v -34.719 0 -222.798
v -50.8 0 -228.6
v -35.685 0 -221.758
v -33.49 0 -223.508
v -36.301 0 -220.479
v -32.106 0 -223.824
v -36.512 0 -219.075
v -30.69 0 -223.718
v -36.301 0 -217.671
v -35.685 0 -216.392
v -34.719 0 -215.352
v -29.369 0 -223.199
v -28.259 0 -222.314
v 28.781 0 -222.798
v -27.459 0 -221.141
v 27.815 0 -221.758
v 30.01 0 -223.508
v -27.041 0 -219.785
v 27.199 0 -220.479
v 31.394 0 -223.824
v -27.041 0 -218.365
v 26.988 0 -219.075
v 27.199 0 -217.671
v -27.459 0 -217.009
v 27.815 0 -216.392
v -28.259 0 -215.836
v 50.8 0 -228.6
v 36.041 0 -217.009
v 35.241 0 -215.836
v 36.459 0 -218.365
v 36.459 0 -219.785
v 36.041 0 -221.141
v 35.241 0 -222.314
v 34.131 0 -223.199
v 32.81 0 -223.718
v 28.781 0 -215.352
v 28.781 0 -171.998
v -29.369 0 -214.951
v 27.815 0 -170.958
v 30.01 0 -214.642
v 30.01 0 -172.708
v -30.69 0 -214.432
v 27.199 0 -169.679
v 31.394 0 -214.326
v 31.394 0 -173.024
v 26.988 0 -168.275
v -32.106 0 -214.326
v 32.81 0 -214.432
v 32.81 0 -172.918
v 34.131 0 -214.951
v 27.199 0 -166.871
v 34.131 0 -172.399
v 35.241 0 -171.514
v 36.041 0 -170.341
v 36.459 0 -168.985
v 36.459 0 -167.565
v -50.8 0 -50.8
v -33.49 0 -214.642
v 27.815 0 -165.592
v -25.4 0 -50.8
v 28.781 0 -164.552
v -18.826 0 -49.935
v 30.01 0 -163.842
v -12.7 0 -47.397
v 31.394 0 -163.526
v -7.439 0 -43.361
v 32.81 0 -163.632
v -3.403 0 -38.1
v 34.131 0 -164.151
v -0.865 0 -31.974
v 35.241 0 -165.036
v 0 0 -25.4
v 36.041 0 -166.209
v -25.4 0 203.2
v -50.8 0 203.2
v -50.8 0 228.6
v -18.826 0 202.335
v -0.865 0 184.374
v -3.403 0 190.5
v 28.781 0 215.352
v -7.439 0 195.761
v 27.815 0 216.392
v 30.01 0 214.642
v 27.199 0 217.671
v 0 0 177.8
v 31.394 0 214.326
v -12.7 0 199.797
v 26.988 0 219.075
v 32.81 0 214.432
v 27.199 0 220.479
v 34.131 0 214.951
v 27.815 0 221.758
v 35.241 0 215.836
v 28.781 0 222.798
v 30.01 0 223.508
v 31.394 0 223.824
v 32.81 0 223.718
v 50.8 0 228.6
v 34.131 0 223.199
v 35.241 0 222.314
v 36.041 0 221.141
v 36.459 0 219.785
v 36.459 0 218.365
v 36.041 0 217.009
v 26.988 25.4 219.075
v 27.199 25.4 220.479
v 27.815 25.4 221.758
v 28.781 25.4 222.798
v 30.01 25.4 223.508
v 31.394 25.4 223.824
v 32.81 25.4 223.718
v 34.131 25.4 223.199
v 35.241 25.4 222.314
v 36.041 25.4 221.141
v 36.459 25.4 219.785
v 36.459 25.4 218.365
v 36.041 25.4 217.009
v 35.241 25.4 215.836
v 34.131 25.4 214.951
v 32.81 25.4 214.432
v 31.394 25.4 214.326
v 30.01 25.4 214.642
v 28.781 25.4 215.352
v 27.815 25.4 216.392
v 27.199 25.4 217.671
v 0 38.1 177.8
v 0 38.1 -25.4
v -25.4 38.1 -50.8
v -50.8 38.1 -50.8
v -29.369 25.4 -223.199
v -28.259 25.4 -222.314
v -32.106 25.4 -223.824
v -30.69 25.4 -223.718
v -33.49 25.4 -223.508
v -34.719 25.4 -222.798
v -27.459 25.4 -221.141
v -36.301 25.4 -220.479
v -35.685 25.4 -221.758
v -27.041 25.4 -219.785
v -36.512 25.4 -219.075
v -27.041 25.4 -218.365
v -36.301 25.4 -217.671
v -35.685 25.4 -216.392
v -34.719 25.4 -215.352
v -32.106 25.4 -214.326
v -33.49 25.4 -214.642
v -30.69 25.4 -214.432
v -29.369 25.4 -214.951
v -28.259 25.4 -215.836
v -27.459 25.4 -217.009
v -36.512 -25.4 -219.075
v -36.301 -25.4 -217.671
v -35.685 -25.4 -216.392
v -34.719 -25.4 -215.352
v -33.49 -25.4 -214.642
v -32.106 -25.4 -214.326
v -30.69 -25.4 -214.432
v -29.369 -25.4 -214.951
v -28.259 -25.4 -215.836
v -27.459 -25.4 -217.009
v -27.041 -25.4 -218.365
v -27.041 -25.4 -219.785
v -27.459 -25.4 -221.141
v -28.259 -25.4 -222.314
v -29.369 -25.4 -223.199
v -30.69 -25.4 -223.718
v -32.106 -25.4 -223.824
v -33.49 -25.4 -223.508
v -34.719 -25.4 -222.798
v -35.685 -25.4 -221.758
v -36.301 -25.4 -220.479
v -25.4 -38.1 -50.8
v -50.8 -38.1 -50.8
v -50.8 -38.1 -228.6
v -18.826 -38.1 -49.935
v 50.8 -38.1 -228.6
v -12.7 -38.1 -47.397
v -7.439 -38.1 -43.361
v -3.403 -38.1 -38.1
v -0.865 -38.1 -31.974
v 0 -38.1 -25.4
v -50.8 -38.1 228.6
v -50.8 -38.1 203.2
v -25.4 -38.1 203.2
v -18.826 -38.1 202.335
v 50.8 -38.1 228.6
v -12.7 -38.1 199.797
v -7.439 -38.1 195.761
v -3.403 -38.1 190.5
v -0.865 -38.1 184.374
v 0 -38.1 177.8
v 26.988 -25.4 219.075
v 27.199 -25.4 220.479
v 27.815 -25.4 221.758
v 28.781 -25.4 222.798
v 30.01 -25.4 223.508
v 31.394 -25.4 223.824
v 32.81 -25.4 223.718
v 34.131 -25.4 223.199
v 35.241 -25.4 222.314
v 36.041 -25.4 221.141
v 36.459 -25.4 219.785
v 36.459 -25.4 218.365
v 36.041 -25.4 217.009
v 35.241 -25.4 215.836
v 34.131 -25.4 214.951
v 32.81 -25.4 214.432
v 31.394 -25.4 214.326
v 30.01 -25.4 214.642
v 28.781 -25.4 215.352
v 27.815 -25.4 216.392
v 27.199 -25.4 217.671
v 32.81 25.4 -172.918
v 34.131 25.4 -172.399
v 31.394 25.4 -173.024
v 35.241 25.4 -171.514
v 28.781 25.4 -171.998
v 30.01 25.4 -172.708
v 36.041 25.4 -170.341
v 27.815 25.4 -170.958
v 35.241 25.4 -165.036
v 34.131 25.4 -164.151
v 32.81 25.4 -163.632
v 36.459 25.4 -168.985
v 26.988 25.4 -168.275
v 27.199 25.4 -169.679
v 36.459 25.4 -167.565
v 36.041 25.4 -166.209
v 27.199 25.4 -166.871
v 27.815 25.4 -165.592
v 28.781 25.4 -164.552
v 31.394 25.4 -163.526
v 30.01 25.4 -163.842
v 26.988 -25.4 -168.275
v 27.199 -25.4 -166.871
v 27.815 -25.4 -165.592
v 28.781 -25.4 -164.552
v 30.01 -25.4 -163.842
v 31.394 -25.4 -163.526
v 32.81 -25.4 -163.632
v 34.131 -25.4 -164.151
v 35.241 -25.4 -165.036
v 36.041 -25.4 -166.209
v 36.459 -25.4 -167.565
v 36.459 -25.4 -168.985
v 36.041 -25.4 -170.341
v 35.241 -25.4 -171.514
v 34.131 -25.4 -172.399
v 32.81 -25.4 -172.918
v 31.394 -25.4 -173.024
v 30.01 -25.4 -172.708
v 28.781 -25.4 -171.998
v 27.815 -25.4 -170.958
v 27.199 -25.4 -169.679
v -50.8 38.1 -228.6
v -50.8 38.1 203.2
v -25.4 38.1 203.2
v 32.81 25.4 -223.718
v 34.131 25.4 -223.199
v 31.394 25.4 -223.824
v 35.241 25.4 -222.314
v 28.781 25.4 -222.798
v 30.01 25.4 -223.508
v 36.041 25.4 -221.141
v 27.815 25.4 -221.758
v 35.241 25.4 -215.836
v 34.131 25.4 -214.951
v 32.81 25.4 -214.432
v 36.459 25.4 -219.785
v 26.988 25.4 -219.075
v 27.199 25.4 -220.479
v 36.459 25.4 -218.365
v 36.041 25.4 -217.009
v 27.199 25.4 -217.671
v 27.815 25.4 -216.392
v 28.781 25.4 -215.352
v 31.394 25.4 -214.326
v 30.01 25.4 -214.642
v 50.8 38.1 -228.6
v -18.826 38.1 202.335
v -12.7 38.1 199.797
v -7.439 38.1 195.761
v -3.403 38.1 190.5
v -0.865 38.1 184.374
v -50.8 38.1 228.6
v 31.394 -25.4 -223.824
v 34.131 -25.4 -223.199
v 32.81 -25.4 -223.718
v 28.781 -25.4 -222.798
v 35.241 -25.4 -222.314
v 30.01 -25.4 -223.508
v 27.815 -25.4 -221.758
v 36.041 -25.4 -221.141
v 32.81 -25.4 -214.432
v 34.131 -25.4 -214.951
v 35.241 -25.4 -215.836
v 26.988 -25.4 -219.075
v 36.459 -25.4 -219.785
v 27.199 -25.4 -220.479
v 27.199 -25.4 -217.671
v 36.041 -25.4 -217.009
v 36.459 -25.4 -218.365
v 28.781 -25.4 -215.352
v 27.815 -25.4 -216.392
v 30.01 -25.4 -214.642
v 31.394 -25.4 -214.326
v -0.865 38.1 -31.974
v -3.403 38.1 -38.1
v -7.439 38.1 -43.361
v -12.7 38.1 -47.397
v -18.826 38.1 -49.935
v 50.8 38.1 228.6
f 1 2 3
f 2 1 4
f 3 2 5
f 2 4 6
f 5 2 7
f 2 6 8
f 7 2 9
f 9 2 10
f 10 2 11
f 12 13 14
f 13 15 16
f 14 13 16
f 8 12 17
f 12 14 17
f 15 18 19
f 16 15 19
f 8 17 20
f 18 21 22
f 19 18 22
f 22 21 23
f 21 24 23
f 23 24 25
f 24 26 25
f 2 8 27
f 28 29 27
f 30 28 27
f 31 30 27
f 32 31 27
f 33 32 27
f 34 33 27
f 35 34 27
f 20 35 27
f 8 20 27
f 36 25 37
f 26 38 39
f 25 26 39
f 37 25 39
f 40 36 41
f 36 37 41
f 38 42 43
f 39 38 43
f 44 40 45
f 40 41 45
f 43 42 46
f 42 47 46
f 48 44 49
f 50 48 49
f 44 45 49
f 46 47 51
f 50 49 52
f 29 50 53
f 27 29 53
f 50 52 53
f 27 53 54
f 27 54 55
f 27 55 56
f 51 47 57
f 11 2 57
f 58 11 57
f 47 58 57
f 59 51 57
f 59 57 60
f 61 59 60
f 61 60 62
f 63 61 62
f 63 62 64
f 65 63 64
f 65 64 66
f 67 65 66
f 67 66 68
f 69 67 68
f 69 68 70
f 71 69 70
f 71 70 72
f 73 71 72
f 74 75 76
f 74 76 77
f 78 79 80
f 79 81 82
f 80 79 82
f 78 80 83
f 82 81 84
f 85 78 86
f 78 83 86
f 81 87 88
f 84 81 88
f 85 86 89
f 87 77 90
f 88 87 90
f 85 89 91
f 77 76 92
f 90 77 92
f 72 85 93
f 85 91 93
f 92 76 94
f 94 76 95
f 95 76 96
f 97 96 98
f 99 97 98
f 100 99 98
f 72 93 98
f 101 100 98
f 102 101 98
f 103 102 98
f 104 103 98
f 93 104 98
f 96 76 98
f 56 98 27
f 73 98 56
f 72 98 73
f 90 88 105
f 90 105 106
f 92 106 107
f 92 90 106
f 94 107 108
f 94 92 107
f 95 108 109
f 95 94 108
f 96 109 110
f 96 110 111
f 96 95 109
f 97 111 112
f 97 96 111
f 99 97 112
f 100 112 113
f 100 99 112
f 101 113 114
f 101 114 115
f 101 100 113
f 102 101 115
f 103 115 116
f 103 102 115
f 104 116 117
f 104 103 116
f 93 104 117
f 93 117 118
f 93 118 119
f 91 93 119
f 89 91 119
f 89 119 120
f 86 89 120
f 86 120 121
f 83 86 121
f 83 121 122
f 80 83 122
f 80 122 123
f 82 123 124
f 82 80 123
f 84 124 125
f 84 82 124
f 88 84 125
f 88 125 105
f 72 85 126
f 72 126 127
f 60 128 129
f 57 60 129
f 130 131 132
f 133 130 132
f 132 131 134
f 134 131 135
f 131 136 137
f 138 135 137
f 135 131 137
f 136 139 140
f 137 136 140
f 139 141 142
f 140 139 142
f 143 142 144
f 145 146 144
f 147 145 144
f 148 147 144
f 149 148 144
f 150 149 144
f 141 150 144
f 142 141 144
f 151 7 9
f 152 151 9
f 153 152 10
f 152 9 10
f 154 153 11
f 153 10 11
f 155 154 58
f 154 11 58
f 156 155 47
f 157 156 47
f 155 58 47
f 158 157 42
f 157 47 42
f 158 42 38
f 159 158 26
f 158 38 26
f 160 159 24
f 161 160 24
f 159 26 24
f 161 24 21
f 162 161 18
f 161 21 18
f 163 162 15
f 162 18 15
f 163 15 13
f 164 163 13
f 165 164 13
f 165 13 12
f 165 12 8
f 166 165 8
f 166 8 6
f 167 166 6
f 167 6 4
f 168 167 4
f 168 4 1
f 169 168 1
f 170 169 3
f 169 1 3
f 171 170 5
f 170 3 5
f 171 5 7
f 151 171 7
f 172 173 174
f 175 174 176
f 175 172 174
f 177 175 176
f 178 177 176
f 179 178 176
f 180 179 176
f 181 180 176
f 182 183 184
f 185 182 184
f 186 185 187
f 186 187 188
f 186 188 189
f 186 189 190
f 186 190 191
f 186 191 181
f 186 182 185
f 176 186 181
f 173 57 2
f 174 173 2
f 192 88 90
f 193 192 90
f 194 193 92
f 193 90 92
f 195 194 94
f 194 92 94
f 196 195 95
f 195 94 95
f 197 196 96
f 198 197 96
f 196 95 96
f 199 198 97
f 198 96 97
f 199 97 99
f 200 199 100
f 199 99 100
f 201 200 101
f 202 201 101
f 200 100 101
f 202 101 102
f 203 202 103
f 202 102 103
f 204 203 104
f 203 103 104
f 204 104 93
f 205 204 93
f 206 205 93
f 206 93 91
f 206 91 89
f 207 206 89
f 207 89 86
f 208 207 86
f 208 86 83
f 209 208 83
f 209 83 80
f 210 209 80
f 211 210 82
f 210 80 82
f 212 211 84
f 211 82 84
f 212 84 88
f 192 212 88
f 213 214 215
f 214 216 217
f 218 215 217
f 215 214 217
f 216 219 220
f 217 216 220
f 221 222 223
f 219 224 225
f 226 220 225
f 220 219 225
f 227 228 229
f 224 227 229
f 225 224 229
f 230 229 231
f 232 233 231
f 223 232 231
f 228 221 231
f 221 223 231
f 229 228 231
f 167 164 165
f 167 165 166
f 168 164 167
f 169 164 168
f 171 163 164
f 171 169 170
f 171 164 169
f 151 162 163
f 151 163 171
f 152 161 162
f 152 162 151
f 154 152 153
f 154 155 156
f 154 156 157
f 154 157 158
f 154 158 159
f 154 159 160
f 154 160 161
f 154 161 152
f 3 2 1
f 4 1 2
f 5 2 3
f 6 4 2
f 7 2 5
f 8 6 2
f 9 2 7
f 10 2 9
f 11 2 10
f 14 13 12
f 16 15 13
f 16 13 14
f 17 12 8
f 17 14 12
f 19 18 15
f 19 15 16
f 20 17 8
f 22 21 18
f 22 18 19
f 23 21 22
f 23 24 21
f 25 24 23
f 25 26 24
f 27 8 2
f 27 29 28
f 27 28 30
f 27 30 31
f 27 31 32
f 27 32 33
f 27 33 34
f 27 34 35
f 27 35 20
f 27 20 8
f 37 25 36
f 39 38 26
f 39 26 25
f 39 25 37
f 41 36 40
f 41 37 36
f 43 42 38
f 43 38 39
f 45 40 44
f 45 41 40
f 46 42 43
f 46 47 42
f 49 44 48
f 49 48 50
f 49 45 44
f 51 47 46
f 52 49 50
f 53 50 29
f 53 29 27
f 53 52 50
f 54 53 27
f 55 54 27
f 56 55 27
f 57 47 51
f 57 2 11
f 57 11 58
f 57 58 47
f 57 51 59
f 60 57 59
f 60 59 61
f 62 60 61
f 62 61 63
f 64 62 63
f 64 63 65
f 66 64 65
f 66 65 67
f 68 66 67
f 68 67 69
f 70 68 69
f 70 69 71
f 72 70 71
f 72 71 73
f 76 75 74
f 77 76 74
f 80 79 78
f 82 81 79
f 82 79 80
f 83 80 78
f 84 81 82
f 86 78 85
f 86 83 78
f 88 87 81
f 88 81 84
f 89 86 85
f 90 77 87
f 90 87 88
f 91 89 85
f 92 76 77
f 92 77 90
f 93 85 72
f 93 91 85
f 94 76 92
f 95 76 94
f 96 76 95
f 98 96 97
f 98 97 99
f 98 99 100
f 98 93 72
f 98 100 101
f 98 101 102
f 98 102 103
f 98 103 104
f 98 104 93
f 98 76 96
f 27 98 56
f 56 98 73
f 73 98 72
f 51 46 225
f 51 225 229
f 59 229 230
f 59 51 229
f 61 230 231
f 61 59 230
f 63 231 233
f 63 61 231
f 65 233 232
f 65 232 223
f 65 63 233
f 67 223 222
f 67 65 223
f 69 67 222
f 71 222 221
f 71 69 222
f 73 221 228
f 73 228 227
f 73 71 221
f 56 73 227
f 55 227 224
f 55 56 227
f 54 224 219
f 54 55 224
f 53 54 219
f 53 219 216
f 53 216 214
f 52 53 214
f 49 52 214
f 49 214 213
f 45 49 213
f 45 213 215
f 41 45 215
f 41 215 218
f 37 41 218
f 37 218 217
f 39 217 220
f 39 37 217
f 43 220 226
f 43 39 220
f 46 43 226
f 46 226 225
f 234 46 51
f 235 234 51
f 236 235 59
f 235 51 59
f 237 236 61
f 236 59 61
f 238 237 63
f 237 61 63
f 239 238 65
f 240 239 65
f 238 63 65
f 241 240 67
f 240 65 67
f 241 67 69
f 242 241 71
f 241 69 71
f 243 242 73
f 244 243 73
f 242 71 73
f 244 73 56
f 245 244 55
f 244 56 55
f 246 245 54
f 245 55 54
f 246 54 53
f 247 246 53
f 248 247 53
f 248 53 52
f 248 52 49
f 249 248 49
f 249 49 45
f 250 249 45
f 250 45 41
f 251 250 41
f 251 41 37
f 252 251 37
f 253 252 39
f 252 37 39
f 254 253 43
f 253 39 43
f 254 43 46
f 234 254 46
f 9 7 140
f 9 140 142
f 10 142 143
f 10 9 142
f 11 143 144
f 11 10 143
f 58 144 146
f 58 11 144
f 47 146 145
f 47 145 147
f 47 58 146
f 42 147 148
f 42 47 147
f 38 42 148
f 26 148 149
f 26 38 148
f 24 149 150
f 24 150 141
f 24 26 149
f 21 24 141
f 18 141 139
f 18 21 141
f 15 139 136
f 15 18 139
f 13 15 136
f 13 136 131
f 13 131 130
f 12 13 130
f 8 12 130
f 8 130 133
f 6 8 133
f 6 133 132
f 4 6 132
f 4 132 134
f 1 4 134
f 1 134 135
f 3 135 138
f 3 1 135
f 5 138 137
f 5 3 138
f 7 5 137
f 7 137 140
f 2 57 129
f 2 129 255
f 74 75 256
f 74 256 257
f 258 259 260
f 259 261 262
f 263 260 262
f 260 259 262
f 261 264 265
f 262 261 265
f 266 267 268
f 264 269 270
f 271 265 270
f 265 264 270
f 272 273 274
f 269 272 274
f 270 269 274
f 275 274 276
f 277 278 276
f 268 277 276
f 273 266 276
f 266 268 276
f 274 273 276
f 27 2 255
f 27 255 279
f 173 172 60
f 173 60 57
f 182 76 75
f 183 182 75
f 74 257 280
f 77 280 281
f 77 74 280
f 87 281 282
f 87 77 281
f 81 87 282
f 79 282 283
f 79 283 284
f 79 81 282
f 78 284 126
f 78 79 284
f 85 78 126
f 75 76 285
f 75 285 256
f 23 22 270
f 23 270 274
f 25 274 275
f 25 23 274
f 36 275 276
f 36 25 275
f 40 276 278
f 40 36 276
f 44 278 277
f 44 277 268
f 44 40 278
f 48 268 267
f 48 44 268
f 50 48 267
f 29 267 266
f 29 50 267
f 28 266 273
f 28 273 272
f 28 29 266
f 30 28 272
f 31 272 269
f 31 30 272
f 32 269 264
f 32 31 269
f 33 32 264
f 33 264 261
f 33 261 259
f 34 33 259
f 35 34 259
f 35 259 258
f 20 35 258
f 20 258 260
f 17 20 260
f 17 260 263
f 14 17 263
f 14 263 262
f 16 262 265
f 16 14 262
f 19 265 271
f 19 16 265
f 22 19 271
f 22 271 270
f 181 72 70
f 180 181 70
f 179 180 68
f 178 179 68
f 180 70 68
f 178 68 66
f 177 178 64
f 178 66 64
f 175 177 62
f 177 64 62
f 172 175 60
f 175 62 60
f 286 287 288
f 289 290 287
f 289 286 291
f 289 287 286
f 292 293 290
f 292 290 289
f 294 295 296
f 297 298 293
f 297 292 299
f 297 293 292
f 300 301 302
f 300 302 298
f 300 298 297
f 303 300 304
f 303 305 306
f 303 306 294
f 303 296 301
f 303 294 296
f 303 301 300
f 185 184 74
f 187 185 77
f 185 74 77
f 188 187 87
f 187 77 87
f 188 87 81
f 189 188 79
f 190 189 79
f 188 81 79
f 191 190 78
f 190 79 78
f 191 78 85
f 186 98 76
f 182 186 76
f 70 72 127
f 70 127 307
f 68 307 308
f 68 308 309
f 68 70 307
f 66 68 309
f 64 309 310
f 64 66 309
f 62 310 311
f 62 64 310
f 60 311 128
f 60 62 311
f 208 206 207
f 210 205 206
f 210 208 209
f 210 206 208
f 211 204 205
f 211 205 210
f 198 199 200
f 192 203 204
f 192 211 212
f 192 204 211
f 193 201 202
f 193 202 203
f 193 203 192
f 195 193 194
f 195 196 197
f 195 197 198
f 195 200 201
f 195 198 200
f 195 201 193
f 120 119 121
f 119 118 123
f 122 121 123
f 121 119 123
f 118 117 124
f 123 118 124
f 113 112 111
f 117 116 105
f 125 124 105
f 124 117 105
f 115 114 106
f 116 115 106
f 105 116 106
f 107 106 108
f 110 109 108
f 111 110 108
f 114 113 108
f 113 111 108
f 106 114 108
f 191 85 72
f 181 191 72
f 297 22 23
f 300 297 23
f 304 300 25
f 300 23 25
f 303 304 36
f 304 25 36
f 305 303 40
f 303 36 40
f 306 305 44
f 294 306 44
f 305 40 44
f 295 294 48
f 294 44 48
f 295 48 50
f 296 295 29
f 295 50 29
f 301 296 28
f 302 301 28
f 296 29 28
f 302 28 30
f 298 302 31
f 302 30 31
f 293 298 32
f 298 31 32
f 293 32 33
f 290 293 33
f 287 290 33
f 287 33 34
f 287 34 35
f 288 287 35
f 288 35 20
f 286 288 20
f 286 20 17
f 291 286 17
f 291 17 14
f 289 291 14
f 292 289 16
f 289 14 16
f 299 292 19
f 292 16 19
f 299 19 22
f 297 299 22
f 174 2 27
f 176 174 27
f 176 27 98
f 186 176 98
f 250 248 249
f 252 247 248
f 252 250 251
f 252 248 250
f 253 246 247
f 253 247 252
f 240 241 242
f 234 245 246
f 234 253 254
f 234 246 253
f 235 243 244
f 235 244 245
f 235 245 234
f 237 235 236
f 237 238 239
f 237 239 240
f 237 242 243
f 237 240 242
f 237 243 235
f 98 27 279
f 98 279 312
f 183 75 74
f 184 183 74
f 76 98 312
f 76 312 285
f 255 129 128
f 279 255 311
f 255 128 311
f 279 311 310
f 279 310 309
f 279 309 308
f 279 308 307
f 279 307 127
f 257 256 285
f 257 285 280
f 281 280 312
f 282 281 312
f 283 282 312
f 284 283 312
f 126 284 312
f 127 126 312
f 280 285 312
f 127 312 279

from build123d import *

# Parameters (mm, degrees)
F1_DEPTH = 38.1
F2_R     = 4.7625
F3_DEPTH = 25.4
F4_R     = 4.7625
F5_DEPTH = 25.4


with BuildPart() as f1:
    # F0 (on Front) → F1 (new body)
    with BuildSketch(Plane.XZ):
        with BuildLine():
            Line((50.8, -228.6), (50.8, 228.6))
            Line((50.8, 228.6), (-50.8, 228.6))
            Line((-50.8, 228.6), (-50.8, 203.2))
            Line((-50.8, 203.2), (-25.4, 203.2))
            ThreePointArc((-25.4, 203.2), (-7.439488, 195.760512), (0, 177.8))
            Line((0, 177.8), (0, -25.4))
            ThreePointArc((0, -25.4), (-7.439488, -43.360512), (-25.4, -50.8))
            Line((-25.4, -50.8), (-50.8, -50.8))
            Line((-50.8, -50.8), (-50.8, -228.6))
            Line((-50.8, -228.6), (50.8, -228.6))
        make_face()
    extrude(amount=F1_DEPTH)

    # F2 (on face) → F3 (cut)
    with BuildSketch(Plane(origin=(0, 0, 0), x_dir=(-1, 0, 0), z_dir=(0, 1, 0))):
        with Locations((-31.75, -219.075)):
            Circle(F2_R)
        with Locations((31.75, -219.075)):
            Circle(F2_R)
        with Locations((-31.75, -168.275)):
            Circle(F2_R)
    extrude(amount=-F3_DEPTH, mode=Mode.SUBTRACT)

    # F4 (on face) → F5 (cut)
    with BuildSketch(Plane(origin=(0, 0, 0), x_dir=(-1, 0, 0), z_dir=(0, 1, 0))):
        with Locations((-31.75, 219.075)):
            Circle(F4_R)
    extrude(amount=-F5_DEPTH, mode=Mode.SUBTRACT)


with BuildPart() as f6_1:
    # F6: instance of F1
    add(f1.part.mirror(Plane.XZ))


solid = Compound([f1.part, f6_1.part])
